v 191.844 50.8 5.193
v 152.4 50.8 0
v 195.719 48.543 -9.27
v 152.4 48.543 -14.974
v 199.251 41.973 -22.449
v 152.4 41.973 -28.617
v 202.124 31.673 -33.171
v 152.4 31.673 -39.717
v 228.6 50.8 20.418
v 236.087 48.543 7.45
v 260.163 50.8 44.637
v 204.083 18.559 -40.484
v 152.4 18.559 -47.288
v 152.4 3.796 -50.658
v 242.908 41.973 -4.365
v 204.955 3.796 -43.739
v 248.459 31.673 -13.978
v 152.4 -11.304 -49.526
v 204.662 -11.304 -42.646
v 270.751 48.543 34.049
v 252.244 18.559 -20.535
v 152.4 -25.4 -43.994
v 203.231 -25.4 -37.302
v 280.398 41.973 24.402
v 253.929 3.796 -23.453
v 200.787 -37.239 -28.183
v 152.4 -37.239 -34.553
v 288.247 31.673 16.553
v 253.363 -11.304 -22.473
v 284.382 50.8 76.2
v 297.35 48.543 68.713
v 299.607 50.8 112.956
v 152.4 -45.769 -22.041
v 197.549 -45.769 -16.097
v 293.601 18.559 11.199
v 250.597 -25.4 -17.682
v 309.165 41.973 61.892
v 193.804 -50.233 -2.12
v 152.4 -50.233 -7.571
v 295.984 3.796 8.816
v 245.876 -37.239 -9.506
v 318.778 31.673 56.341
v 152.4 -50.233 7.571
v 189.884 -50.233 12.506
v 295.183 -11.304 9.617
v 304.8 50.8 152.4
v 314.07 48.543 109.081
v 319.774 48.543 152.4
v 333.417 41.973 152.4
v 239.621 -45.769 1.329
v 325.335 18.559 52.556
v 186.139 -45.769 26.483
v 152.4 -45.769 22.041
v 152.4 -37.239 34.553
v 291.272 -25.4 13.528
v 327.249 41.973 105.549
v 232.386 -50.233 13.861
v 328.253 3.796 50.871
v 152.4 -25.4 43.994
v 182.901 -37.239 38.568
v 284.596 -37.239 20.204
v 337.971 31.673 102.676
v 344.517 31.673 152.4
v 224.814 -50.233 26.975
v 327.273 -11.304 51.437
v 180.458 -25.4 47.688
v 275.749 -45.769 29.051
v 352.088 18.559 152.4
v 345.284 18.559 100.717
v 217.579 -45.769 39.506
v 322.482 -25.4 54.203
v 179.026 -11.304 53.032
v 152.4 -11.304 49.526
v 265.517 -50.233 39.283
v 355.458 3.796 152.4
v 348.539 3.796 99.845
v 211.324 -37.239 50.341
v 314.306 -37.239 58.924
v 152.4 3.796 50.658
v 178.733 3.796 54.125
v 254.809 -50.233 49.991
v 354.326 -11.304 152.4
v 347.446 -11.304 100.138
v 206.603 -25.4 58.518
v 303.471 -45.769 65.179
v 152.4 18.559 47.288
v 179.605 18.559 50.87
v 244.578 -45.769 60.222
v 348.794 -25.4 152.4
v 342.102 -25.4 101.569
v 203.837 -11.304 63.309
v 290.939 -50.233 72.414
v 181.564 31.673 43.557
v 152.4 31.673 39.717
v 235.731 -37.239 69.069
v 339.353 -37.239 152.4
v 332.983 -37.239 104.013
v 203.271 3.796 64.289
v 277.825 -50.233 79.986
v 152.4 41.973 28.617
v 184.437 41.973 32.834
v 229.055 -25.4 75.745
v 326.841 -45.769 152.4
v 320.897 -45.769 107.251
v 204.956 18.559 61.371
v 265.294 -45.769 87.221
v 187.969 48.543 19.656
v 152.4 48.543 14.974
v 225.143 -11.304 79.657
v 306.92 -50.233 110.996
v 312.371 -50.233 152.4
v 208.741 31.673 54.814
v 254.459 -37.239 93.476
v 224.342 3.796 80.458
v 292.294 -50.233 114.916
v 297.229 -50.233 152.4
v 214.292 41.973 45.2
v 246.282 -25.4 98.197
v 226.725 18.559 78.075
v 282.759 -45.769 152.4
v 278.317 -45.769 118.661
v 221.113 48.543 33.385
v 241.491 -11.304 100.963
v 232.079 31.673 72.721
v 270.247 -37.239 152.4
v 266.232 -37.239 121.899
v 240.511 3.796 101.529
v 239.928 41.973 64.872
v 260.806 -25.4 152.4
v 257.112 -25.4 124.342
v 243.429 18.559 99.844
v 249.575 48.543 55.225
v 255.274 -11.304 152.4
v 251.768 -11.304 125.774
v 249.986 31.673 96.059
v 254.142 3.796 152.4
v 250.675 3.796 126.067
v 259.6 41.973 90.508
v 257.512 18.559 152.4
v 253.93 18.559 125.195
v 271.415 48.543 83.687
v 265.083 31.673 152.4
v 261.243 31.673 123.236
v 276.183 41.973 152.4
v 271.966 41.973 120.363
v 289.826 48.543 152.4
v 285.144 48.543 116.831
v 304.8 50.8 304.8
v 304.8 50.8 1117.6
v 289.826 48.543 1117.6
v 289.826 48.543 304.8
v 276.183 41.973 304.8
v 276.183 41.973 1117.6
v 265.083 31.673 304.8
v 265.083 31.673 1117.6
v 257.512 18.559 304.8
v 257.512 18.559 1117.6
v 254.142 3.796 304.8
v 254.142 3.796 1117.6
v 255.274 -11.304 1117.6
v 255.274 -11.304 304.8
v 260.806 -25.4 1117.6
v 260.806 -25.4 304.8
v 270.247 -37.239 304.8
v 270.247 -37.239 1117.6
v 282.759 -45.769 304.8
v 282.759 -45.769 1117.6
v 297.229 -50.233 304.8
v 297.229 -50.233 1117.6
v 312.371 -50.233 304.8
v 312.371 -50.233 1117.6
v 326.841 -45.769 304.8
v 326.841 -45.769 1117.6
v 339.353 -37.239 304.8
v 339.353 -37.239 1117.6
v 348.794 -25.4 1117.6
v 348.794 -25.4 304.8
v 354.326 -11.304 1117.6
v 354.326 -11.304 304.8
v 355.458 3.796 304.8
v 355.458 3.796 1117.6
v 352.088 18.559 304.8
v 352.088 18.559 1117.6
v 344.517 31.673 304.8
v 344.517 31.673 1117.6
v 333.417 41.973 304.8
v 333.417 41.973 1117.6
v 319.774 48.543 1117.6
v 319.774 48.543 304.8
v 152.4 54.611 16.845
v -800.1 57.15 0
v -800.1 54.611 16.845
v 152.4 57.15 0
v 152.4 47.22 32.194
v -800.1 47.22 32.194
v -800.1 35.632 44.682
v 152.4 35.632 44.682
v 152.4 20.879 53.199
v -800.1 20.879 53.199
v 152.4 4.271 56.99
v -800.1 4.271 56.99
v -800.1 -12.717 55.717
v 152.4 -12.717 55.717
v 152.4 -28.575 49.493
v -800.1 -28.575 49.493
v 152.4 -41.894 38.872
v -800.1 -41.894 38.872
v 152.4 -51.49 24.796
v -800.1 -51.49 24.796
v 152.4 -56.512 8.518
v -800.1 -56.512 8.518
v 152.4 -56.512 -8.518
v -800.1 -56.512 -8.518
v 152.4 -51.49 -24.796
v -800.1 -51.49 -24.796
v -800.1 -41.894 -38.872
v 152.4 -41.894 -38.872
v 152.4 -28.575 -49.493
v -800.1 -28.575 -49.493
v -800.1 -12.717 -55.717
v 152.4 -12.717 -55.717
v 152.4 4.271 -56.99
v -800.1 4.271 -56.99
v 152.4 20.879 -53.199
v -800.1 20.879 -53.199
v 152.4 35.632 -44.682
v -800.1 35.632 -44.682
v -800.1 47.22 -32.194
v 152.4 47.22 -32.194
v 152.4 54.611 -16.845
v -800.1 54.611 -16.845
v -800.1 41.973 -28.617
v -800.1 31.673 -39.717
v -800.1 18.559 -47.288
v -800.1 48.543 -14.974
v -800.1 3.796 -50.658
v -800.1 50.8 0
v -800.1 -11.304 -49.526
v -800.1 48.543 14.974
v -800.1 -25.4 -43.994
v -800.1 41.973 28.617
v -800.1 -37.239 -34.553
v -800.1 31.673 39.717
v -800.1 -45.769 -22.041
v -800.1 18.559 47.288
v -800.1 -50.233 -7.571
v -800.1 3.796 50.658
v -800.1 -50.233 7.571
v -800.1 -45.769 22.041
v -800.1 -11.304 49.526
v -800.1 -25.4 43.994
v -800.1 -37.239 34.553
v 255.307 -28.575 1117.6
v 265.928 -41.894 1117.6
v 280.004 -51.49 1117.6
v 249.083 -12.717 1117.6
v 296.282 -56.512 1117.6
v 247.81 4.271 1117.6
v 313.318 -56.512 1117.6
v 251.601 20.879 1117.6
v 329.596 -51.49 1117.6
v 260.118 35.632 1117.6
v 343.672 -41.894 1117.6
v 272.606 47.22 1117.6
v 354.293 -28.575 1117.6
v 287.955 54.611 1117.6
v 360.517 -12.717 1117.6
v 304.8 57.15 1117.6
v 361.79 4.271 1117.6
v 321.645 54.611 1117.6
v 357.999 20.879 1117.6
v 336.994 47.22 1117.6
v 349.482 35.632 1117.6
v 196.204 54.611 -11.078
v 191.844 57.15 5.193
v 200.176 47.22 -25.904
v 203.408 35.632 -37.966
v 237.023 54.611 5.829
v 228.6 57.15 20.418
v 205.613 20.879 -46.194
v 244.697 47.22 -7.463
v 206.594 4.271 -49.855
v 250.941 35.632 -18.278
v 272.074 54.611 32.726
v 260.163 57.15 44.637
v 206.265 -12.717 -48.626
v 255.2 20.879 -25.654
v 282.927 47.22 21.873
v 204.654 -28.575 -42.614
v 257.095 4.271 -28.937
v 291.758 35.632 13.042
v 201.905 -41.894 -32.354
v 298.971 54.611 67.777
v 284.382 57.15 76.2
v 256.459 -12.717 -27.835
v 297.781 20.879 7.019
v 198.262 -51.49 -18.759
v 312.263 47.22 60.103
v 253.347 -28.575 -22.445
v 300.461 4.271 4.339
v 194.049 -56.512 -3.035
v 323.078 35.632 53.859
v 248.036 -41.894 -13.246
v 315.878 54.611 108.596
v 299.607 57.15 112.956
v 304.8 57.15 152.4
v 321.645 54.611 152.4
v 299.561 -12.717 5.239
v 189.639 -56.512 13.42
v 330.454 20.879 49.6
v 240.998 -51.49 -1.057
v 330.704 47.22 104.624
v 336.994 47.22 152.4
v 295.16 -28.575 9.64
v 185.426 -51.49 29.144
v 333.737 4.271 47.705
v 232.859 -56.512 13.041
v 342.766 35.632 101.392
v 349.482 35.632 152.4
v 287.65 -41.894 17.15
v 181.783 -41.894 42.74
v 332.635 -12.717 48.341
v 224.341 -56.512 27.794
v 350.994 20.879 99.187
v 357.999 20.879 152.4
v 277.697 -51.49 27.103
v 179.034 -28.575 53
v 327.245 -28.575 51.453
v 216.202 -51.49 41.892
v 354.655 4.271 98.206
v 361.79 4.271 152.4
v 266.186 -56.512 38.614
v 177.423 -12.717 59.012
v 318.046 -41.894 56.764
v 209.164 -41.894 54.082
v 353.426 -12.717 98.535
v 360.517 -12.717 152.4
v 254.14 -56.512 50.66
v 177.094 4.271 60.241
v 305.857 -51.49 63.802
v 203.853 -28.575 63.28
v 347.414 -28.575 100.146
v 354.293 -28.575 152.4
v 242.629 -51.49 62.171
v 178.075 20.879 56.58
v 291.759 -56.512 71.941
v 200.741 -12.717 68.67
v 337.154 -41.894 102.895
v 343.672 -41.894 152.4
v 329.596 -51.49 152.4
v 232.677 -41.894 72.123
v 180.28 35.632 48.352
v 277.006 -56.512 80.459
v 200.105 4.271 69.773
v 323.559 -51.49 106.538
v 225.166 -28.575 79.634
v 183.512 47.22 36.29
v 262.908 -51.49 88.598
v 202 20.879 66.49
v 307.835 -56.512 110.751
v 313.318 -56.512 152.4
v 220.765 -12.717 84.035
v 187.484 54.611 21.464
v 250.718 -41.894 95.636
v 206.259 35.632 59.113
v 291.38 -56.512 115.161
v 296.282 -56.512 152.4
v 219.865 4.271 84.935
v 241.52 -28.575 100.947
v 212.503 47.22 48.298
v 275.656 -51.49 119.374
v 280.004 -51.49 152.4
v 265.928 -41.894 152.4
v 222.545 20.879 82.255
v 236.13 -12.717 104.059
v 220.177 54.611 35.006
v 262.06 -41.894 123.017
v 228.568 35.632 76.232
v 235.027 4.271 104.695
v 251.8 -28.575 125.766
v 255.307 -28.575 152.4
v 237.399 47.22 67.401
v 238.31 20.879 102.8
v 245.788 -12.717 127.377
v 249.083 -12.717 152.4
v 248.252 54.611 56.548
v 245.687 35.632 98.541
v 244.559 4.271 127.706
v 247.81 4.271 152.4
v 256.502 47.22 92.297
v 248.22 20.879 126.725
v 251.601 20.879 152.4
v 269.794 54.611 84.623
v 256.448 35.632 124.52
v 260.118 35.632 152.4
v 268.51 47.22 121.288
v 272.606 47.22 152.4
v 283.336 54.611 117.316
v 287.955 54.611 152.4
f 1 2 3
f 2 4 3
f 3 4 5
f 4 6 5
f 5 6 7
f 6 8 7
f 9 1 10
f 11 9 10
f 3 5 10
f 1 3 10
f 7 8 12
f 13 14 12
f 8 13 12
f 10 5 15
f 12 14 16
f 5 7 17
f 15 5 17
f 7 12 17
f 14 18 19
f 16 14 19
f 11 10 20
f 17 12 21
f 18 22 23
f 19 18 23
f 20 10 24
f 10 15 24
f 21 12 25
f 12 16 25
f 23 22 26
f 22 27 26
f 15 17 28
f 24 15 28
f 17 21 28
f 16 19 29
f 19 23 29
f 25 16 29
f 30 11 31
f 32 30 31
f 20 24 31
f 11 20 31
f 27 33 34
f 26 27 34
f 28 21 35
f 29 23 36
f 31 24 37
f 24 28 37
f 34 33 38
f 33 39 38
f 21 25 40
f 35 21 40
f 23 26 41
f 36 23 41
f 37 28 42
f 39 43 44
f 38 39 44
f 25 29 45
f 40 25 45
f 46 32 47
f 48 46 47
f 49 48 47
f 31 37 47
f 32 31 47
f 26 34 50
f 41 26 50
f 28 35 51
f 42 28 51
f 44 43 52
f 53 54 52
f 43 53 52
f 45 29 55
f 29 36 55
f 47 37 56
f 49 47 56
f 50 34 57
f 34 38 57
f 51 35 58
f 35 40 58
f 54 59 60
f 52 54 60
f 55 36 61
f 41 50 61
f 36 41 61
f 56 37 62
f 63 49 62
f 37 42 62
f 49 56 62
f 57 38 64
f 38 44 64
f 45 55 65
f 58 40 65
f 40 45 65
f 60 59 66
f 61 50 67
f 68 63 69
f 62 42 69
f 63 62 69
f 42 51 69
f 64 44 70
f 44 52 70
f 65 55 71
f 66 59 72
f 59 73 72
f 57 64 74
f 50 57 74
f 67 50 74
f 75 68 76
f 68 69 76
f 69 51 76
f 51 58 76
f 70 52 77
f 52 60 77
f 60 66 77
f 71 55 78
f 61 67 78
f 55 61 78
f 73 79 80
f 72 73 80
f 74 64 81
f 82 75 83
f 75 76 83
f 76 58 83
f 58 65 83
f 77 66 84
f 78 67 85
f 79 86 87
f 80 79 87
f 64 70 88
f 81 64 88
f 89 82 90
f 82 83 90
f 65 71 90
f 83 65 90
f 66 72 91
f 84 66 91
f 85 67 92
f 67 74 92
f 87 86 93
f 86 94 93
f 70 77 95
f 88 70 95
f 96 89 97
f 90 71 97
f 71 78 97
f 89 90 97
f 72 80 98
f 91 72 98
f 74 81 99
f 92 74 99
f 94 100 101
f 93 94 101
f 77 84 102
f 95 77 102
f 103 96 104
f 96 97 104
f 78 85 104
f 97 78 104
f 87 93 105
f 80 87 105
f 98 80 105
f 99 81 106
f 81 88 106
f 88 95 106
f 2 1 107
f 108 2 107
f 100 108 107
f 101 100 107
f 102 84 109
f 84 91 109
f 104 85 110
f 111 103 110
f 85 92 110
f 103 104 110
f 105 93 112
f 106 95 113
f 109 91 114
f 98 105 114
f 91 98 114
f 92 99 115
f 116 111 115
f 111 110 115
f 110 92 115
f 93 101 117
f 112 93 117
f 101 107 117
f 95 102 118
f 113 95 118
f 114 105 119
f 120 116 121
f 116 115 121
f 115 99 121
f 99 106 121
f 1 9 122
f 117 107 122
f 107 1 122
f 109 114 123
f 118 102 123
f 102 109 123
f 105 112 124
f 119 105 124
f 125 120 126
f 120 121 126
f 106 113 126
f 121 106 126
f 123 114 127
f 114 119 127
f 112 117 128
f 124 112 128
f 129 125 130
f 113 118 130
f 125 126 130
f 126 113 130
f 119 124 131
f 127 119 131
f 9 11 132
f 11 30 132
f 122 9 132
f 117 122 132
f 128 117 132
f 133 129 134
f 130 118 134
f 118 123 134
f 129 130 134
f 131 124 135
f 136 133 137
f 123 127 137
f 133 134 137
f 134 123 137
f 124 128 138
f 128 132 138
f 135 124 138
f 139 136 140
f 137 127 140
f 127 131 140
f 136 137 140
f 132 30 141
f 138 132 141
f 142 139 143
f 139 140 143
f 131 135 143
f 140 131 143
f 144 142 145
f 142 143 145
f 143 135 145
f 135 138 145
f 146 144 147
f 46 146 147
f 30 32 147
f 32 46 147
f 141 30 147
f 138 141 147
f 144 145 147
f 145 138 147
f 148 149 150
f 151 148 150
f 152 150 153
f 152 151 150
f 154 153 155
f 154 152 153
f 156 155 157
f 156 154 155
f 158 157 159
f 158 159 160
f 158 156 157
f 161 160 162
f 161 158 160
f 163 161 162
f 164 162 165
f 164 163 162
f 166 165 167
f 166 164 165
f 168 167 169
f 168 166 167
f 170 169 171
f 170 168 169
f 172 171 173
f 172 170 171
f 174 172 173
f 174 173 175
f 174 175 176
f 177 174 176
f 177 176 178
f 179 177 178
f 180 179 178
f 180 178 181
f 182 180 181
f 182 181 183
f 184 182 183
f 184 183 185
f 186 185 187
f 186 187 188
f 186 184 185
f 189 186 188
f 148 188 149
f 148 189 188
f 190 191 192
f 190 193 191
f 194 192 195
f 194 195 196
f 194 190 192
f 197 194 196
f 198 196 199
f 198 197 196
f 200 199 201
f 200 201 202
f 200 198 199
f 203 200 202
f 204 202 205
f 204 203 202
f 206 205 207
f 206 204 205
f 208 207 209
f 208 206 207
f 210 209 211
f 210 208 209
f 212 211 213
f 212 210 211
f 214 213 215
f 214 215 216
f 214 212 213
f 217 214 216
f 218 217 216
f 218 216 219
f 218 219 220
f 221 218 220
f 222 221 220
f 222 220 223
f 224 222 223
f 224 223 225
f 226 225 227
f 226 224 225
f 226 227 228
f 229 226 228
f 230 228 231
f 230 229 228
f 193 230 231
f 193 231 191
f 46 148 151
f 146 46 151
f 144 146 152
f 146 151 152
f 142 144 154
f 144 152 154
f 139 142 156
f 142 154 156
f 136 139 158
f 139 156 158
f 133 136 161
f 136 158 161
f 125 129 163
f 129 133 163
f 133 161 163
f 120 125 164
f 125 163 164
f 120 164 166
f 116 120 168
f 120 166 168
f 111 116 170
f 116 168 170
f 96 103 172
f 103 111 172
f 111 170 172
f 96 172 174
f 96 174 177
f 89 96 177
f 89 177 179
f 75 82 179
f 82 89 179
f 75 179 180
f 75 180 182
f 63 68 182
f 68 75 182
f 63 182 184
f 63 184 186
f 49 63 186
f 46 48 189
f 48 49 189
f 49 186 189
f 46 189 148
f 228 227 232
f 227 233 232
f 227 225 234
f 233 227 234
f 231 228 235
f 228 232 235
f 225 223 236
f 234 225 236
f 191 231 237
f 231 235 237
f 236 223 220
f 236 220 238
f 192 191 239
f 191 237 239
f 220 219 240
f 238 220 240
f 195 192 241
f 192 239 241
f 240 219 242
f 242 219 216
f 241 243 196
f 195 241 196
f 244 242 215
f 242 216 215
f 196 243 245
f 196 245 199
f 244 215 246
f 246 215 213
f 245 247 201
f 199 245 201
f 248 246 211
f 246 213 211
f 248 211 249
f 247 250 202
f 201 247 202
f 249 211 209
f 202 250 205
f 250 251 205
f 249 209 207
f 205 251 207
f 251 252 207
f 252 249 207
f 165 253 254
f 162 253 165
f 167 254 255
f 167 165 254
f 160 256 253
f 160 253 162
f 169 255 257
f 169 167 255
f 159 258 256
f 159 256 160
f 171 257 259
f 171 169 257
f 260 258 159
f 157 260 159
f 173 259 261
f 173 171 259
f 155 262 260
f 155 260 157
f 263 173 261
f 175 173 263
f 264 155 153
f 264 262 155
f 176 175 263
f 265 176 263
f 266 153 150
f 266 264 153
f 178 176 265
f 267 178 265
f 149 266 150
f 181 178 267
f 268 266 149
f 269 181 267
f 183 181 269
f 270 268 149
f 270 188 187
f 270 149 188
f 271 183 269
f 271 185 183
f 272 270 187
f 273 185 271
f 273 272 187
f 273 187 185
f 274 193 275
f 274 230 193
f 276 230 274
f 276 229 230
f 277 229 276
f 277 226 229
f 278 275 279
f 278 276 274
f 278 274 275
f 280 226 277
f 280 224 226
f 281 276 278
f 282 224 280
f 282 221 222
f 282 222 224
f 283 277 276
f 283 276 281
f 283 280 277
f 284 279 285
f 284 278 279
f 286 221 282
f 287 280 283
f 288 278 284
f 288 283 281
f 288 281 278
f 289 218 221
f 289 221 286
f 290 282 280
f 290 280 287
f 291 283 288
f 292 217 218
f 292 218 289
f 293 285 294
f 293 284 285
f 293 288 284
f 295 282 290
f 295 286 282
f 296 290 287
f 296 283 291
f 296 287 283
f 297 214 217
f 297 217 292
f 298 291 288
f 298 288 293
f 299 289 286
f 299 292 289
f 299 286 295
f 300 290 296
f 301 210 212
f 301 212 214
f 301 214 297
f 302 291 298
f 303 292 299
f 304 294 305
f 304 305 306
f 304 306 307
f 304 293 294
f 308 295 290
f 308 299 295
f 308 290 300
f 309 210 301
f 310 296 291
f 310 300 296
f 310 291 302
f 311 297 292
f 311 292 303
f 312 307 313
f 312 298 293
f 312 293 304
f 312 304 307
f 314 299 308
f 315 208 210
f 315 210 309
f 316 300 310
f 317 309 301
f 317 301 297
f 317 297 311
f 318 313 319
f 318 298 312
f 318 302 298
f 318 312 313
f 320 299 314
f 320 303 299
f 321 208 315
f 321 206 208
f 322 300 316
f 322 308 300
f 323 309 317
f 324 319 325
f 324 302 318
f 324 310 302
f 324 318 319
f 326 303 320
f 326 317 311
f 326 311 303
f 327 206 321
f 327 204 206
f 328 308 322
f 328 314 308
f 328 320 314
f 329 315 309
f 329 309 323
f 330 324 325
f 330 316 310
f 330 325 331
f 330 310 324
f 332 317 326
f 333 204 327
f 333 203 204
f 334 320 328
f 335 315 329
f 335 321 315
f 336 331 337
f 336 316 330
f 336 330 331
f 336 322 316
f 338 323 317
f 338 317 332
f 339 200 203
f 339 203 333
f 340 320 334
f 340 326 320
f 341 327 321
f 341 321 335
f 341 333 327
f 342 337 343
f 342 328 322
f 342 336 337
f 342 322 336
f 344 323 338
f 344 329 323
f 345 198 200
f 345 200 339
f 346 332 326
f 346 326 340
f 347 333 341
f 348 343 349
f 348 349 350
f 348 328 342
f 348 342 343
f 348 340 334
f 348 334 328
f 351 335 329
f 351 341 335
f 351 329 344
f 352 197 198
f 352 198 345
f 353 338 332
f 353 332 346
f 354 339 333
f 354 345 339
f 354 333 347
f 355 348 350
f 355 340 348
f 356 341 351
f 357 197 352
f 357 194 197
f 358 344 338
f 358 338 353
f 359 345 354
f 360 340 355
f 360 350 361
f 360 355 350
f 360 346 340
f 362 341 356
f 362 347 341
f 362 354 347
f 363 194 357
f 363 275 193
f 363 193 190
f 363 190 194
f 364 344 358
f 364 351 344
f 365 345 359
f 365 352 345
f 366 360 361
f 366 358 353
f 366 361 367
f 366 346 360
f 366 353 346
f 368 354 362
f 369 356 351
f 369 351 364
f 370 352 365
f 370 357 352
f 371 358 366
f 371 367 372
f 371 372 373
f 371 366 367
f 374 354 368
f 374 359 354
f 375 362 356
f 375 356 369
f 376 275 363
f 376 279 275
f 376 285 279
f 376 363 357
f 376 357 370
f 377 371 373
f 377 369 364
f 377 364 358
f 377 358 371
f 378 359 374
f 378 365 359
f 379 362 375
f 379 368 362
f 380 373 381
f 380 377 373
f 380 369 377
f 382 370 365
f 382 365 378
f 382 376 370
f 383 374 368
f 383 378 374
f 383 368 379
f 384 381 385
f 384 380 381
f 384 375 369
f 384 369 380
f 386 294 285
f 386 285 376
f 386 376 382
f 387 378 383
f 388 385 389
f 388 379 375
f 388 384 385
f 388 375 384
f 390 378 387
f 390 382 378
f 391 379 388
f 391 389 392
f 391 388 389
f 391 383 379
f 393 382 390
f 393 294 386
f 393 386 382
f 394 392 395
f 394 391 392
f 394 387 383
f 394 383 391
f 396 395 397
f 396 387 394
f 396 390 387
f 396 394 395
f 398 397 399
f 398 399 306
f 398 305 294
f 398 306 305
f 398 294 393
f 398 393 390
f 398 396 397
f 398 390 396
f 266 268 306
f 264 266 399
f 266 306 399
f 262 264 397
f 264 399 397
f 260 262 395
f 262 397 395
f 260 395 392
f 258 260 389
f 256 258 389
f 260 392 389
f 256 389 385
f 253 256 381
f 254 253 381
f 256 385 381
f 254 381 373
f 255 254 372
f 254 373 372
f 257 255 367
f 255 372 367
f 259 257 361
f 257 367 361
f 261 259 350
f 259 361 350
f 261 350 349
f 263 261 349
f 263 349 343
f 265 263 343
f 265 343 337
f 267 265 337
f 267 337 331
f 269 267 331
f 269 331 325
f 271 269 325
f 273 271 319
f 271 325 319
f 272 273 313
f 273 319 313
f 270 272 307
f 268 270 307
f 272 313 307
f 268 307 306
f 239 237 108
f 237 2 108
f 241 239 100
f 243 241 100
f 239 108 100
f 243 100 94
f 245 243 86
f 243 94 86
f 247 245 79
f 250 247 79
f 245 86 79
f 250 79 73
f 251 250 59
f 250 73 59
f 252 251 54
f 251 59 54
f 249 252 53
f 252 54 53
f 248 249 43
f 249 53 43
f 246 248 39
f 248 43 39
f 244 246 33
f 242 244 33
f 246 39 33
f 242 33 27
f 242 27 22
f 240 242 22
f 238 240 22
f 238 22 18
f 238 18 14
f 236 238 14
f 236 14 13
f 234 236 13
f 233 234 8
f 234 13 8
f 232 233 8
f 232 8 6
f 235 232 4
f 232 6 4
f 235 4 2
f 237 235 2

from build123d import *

# Parameters (mm, degrees)
F1_R     = 57.15
F1_R_2   = 50.8
F3_DEPTH = 812.8
F4_DEPTH = 800.1


with BuildPart() as f2:
    # F2: sweep along a path in F0
    with BuildLine(Plane.XZ) as f2_path:
        Line((0, 0), (152.4, 0))
        ThreePointArc((152.4, 0), (260.1630734528, 44.6369265472), (304.8, 152.4))
        Line((304.8, 152.4), (304.8, 304.8))
    # F1 (on Right) → F2 (sweep)
    with BuildSketch(Plane.YZ):
        Circle(F1_R)
        Circle(F1_R_2, mode=Mode.SUBTRACT)
    sweep(path=f2_path.line)

    # F3 (add): a face of the model
    f3_faces = [f2.faces().sort_by_distance(p)[0] for p in [
        (304.8, -55.5335538982, 304.8),
    ]]
    extrude(f3_faces, amount=F3_DEPTH)

    # F4 (add): a face of the model
    f4_faces = [f2.faces().sort_by_distance(p)[0] for p in [
        (0, -55.5335538982, 0),
    ]]
    extrude(f4_faces, amount=F4_DEPTH)


solid = f2.part
